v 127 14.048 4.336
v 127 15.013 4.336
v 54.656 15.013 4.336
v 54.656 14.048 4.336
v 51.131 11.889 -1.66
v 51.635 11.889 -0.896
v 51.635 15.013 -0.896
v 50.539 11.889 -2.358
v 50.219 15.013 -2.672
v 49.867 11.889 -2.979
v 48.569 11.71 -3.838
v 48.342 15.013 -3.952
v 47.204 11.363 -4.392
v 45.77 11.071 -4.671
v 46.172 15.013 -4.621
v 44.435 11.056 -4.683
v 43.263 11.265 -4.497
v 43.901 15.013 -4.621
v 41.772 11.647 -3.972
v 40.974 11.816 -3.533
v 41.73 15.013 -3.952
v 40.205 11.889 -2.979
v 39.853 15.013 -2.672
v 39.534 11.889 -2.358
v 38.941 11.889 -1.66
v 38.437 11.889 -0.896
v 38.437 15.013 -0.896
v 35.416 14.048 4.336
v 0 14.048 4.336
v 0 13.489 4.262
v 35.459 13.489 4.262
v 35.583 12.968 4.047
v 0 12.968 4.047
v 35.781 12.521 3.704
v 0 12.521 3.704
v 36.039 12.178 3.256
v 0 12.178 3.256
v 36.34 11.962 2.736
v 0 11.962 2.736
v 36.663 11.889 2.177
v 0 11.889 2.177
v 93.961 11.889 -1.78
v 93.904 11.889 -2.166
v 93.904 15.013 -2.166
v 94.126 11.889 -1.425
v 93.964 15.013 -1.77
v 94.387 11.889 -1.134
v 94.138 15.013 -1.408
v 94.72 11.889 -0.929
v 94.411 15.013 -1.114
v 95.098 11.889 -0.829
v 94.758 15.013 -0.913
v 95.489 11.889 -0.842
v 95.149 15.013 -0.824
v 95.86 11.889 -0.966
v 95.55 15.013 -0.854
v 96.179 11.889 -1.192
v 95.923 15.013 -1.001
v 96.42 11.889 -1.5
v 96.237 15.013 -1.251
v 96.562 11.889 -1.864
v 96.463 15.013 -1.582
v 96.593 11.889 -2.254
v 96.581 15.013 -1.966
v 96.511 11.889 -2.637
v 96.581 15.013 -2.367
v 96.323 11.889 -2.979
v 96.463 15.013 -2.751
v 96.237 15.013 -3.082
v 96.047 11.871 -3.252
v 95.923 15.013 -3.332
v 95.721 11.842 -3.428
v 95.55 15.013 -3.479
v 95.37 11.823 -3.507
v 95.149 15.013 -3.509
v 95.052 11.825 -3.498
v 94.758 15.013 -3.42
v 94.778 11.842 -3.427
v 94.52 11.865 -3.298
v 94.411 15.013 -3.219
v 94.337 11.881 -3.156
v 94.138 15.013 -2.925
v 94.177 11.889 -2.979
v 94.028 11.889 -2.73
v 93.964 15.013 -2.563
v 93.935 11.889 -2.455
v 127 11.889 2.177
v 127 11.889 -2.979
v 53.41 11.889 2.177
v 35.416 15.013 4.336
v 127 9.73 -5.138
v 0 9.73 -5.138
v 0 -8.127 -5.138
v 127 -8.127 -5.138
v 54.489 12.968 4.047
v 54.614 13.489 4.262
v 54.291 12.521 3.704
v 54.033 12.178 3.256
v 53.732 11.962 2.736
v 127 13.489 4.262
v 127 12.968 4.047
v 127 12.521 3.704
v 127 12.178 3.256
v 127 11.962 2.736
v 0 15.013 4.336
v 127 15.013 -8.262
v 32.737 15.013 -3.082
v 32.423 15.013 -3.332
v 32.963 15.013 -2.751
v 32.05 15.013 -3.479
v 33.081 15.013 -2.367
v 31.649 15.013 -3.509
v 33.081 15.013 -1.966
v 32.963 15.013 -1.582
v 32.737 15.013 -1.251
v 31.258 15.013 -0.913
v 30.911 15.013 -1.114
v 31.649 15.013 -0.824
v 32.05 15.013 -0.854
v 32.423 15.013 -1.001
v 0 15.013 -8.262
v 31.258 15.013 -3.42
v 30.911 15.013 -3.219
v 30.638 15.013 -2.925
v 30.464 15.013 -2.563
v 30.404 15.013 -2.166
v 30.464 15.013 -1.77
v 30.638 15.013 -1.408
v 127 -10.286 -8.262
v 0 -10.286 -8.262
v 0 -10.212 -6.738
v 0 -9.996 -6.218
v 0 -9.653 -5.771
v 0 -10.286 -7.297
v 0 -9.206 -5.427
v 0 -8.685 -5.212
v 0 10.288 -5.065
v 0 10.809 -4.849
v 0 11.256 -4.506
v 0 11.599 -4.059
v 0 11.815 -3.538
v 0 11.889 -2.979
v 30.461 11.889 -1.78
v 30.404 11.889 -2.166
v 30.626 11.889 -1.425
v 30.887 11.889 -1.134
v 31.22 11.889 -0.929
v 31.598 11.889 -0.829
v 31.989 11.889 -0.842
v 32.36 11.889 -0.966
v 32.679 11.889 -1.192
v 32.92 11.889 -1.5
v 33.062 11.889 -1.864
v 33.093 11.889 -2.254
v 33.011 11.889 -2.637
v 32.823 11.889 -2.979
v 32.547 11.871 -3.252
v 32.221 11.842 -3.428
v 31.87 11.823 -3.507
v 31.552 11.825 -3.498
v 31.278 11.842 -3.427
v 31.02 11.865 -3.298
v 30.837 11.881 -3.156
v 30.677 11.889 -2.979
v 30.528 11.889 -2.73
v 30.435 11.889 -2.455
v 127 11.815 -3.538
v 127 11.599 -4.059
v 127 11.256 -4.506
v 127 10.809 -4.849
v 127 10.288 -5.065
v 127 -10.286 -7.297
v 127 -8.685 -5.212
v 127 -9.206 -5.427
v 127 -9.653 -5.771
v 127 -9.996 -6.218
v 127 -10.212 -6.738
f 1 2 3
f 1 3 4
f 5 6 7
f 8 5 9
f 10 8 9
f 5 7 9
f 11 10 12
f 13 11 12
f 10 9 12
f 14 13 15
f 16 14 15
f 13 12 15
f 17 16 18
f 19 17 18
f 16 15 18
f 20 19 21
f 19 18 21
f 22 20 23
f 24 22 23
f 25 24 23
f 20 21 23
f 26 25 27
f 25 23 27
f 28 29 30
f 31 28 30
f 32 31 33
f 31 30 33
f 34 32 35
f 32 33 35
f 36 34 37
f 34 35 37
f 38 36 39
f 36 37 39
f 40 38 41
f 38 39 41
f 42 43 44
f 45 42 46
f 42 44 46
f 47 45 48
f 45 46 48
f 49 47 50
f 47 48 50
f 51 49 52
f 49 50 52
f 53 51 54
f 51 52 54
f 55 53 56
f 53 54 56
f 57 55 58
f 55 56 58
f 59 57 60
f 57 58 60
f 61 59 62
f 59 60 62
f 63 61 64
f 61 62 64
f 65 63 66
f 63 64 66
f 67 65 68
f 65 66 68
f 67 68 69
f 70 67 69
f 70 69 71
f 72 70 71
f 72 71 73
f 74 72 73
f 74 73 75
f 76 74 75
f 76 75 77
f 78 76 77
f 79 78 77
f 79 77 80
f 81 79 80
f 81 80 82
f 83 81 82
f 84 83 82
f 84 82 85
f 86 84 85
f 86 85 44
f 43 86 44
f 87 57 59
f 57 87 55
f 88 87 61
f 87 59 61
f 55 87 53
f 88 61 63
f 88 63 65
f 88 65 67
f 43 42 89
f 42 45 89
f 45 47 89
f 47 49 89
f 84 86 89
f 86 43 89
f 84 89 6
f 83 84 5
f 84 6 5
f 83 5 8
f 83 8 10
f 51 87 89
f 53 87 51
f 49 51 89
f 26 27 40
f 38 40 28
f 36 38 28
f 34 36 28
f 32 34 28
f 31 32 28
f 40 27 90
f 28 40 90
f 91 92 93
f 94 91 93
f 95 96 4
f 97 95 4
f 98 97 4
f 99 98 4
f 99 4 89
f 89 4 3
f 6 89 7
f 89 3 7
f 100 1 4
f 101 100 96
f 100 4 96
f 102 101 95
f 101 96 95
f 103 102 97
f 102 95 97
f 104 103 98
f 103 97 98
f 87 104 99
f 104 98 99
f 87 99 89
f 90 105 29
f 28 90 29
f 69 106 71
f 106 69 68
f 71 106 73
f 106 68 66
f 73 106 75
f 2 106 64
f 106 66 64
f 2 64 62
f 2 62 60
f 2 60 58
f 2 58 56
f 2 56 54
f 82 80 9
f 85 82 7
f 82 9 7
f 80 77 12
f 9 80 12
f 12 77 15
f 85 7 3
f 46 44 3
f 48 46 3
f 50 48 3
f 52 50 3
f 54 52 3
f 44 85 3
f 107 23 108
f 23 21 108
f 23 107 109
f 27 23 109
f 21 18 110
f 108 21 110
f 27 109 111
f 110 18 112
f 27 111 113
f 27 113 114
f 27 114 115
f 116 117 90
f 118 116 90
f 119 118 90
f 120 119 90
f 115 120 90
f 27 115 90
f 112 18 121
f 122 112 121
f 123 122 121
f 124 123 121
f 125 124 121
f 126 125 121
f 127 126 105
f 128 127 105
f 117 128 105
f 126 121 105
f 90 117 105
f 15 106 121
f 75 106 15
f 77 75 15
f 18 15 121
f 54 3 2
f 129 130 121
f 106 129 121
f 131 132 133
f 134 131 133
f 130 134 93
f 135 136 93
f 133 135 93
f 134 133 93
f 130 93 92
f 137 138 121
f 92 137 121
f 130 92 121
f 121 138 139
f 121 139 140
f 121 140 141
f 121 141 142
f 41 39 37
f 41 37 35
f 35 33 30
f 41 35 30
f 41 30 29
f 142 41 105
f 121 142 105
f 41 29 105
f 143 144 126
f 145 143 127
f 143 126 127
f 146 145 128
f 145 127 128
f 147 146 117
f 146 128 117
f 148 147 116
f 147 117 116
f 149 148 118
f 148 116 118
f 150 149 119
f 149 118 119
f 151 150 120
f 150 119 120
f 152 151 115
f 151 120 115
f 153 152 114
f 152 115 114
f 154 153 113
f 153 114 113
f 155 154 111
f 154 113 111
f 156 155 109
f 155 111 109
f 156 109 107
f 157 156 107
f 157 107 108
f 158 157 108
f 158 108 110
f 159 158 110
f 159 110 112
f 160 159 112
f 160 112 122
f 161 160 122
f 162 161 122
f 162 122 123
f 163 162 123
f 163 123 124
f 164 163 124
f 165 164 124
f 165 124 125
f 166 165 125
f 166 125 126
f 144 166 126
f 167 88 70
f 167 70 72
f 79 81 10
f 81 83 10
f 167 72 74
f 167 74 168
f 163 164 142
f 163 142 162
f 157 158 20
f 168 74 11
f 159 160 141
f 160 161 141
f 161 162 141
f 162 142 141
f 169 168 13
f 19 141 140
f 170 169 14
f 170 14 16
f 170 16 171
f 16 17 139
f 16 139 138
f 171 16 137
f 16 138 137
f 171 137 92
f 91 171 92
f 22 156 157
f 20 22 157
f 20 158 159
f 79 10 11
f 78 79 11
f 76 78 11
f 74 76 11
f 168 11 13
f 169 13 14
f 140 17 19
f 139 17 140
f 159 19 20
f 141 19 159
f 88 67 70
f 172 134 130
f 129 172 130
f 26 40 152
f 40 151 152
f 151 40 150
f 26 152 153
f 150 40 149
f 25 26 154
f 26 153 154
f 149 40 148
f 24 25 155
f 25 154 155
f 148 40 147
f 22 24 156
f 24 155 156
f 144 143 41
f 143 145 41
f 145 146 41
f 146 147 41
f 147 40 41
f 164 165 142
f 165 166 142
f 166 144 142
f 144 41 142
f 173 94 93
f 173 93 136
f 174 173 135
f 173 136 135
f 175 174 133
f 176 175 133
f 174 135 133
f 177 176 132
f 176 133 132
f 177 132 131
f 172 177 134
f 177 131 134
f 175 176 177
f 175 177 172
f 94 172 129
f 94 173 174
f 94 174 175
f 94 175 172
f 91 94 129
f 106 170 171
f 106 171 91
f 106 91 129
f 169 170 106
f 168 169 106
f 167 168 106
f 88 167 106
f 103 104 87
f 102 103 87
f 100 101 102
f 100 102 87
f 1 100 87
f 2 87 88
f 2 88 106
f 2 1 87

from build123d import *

# Parameters (mm, degrees)
F1_DEPTH = 127
F2_R     = 1.3462
F3_DEPTH = 25.2994
F5_DEPTH = 25.2994


with BuildPart() as f1:
    # F0 (on Right) → F1 (new body)
    with BuildSketch(Plane.YZ):
        with BuildLine():
            Line((-10.285505, -7.297242), (-10.285505, -8.262442))
            Line((-10.285505, -8.262442), (15.012895, -8.262442))
            Line((15.012895, -8.262442), (15.012895, 4.335958))
            Line((15.012895, 4.335958), (14.047695, 4.335958))
            ThreePointArc((14.047695, 4.335958), (12.521052, 3.703602), (11.888695, 2.176958))
            Line((11.888695, 2.176958), (11.888695, -2.979242))
            ThreePointArc((11.888695, -2.979242), (11.256339, -4.505885), (9.729695, -5.138242))
            Line((9.729695, -5.138242), (-8.126505, -5.138242))
            ThreePointArc((-8.126505, -5.138242), (-9.653148, -5.770598), (-10.285505, -7.297242))
        make_face()
    extrude(amount=F1_DEPTH)

    # F2 (on face) → F3 (cut, through all)
    with BuildSketch(Plane(origin=(0, 15.012895, 0), x_dir=(-1, 0, 0), z_dir=(0, 1, 0))):
        with Locations((-31.75, -2.166442)):
            Circle(F2_R)
        with Locations((-95.25, -2.166442)):
            Circle(F2_R)
    extrude(amount=-F3_DEPTH, mode=Mode.SUBTRACT)

    # F4 (on face) → F5 (cut, through all)
    with BuildSketch(Plane(origin=(0, 15.012895, 0), x_dir=(-1, 0, 0), z_dir=(0, 1, 0))):
        with BuildLine():
            Line((-54.656256, 4.335958), (-51.635329, -0.896442))
            ThreePointArc((-51.635329, -0.896442), (-45.036215, -4.706442), (-38.437102, -0.896442))
            Line((-38.437102, -0.896442), (-35.416174, 4.335958))
            Line((-35.416174, 4.335958), (-54.656256, 4.335958))
        make_face()
    extrude(amount=-F5_DEPTH, mode=Mode.SUBTRACT)


solid = f1.part
